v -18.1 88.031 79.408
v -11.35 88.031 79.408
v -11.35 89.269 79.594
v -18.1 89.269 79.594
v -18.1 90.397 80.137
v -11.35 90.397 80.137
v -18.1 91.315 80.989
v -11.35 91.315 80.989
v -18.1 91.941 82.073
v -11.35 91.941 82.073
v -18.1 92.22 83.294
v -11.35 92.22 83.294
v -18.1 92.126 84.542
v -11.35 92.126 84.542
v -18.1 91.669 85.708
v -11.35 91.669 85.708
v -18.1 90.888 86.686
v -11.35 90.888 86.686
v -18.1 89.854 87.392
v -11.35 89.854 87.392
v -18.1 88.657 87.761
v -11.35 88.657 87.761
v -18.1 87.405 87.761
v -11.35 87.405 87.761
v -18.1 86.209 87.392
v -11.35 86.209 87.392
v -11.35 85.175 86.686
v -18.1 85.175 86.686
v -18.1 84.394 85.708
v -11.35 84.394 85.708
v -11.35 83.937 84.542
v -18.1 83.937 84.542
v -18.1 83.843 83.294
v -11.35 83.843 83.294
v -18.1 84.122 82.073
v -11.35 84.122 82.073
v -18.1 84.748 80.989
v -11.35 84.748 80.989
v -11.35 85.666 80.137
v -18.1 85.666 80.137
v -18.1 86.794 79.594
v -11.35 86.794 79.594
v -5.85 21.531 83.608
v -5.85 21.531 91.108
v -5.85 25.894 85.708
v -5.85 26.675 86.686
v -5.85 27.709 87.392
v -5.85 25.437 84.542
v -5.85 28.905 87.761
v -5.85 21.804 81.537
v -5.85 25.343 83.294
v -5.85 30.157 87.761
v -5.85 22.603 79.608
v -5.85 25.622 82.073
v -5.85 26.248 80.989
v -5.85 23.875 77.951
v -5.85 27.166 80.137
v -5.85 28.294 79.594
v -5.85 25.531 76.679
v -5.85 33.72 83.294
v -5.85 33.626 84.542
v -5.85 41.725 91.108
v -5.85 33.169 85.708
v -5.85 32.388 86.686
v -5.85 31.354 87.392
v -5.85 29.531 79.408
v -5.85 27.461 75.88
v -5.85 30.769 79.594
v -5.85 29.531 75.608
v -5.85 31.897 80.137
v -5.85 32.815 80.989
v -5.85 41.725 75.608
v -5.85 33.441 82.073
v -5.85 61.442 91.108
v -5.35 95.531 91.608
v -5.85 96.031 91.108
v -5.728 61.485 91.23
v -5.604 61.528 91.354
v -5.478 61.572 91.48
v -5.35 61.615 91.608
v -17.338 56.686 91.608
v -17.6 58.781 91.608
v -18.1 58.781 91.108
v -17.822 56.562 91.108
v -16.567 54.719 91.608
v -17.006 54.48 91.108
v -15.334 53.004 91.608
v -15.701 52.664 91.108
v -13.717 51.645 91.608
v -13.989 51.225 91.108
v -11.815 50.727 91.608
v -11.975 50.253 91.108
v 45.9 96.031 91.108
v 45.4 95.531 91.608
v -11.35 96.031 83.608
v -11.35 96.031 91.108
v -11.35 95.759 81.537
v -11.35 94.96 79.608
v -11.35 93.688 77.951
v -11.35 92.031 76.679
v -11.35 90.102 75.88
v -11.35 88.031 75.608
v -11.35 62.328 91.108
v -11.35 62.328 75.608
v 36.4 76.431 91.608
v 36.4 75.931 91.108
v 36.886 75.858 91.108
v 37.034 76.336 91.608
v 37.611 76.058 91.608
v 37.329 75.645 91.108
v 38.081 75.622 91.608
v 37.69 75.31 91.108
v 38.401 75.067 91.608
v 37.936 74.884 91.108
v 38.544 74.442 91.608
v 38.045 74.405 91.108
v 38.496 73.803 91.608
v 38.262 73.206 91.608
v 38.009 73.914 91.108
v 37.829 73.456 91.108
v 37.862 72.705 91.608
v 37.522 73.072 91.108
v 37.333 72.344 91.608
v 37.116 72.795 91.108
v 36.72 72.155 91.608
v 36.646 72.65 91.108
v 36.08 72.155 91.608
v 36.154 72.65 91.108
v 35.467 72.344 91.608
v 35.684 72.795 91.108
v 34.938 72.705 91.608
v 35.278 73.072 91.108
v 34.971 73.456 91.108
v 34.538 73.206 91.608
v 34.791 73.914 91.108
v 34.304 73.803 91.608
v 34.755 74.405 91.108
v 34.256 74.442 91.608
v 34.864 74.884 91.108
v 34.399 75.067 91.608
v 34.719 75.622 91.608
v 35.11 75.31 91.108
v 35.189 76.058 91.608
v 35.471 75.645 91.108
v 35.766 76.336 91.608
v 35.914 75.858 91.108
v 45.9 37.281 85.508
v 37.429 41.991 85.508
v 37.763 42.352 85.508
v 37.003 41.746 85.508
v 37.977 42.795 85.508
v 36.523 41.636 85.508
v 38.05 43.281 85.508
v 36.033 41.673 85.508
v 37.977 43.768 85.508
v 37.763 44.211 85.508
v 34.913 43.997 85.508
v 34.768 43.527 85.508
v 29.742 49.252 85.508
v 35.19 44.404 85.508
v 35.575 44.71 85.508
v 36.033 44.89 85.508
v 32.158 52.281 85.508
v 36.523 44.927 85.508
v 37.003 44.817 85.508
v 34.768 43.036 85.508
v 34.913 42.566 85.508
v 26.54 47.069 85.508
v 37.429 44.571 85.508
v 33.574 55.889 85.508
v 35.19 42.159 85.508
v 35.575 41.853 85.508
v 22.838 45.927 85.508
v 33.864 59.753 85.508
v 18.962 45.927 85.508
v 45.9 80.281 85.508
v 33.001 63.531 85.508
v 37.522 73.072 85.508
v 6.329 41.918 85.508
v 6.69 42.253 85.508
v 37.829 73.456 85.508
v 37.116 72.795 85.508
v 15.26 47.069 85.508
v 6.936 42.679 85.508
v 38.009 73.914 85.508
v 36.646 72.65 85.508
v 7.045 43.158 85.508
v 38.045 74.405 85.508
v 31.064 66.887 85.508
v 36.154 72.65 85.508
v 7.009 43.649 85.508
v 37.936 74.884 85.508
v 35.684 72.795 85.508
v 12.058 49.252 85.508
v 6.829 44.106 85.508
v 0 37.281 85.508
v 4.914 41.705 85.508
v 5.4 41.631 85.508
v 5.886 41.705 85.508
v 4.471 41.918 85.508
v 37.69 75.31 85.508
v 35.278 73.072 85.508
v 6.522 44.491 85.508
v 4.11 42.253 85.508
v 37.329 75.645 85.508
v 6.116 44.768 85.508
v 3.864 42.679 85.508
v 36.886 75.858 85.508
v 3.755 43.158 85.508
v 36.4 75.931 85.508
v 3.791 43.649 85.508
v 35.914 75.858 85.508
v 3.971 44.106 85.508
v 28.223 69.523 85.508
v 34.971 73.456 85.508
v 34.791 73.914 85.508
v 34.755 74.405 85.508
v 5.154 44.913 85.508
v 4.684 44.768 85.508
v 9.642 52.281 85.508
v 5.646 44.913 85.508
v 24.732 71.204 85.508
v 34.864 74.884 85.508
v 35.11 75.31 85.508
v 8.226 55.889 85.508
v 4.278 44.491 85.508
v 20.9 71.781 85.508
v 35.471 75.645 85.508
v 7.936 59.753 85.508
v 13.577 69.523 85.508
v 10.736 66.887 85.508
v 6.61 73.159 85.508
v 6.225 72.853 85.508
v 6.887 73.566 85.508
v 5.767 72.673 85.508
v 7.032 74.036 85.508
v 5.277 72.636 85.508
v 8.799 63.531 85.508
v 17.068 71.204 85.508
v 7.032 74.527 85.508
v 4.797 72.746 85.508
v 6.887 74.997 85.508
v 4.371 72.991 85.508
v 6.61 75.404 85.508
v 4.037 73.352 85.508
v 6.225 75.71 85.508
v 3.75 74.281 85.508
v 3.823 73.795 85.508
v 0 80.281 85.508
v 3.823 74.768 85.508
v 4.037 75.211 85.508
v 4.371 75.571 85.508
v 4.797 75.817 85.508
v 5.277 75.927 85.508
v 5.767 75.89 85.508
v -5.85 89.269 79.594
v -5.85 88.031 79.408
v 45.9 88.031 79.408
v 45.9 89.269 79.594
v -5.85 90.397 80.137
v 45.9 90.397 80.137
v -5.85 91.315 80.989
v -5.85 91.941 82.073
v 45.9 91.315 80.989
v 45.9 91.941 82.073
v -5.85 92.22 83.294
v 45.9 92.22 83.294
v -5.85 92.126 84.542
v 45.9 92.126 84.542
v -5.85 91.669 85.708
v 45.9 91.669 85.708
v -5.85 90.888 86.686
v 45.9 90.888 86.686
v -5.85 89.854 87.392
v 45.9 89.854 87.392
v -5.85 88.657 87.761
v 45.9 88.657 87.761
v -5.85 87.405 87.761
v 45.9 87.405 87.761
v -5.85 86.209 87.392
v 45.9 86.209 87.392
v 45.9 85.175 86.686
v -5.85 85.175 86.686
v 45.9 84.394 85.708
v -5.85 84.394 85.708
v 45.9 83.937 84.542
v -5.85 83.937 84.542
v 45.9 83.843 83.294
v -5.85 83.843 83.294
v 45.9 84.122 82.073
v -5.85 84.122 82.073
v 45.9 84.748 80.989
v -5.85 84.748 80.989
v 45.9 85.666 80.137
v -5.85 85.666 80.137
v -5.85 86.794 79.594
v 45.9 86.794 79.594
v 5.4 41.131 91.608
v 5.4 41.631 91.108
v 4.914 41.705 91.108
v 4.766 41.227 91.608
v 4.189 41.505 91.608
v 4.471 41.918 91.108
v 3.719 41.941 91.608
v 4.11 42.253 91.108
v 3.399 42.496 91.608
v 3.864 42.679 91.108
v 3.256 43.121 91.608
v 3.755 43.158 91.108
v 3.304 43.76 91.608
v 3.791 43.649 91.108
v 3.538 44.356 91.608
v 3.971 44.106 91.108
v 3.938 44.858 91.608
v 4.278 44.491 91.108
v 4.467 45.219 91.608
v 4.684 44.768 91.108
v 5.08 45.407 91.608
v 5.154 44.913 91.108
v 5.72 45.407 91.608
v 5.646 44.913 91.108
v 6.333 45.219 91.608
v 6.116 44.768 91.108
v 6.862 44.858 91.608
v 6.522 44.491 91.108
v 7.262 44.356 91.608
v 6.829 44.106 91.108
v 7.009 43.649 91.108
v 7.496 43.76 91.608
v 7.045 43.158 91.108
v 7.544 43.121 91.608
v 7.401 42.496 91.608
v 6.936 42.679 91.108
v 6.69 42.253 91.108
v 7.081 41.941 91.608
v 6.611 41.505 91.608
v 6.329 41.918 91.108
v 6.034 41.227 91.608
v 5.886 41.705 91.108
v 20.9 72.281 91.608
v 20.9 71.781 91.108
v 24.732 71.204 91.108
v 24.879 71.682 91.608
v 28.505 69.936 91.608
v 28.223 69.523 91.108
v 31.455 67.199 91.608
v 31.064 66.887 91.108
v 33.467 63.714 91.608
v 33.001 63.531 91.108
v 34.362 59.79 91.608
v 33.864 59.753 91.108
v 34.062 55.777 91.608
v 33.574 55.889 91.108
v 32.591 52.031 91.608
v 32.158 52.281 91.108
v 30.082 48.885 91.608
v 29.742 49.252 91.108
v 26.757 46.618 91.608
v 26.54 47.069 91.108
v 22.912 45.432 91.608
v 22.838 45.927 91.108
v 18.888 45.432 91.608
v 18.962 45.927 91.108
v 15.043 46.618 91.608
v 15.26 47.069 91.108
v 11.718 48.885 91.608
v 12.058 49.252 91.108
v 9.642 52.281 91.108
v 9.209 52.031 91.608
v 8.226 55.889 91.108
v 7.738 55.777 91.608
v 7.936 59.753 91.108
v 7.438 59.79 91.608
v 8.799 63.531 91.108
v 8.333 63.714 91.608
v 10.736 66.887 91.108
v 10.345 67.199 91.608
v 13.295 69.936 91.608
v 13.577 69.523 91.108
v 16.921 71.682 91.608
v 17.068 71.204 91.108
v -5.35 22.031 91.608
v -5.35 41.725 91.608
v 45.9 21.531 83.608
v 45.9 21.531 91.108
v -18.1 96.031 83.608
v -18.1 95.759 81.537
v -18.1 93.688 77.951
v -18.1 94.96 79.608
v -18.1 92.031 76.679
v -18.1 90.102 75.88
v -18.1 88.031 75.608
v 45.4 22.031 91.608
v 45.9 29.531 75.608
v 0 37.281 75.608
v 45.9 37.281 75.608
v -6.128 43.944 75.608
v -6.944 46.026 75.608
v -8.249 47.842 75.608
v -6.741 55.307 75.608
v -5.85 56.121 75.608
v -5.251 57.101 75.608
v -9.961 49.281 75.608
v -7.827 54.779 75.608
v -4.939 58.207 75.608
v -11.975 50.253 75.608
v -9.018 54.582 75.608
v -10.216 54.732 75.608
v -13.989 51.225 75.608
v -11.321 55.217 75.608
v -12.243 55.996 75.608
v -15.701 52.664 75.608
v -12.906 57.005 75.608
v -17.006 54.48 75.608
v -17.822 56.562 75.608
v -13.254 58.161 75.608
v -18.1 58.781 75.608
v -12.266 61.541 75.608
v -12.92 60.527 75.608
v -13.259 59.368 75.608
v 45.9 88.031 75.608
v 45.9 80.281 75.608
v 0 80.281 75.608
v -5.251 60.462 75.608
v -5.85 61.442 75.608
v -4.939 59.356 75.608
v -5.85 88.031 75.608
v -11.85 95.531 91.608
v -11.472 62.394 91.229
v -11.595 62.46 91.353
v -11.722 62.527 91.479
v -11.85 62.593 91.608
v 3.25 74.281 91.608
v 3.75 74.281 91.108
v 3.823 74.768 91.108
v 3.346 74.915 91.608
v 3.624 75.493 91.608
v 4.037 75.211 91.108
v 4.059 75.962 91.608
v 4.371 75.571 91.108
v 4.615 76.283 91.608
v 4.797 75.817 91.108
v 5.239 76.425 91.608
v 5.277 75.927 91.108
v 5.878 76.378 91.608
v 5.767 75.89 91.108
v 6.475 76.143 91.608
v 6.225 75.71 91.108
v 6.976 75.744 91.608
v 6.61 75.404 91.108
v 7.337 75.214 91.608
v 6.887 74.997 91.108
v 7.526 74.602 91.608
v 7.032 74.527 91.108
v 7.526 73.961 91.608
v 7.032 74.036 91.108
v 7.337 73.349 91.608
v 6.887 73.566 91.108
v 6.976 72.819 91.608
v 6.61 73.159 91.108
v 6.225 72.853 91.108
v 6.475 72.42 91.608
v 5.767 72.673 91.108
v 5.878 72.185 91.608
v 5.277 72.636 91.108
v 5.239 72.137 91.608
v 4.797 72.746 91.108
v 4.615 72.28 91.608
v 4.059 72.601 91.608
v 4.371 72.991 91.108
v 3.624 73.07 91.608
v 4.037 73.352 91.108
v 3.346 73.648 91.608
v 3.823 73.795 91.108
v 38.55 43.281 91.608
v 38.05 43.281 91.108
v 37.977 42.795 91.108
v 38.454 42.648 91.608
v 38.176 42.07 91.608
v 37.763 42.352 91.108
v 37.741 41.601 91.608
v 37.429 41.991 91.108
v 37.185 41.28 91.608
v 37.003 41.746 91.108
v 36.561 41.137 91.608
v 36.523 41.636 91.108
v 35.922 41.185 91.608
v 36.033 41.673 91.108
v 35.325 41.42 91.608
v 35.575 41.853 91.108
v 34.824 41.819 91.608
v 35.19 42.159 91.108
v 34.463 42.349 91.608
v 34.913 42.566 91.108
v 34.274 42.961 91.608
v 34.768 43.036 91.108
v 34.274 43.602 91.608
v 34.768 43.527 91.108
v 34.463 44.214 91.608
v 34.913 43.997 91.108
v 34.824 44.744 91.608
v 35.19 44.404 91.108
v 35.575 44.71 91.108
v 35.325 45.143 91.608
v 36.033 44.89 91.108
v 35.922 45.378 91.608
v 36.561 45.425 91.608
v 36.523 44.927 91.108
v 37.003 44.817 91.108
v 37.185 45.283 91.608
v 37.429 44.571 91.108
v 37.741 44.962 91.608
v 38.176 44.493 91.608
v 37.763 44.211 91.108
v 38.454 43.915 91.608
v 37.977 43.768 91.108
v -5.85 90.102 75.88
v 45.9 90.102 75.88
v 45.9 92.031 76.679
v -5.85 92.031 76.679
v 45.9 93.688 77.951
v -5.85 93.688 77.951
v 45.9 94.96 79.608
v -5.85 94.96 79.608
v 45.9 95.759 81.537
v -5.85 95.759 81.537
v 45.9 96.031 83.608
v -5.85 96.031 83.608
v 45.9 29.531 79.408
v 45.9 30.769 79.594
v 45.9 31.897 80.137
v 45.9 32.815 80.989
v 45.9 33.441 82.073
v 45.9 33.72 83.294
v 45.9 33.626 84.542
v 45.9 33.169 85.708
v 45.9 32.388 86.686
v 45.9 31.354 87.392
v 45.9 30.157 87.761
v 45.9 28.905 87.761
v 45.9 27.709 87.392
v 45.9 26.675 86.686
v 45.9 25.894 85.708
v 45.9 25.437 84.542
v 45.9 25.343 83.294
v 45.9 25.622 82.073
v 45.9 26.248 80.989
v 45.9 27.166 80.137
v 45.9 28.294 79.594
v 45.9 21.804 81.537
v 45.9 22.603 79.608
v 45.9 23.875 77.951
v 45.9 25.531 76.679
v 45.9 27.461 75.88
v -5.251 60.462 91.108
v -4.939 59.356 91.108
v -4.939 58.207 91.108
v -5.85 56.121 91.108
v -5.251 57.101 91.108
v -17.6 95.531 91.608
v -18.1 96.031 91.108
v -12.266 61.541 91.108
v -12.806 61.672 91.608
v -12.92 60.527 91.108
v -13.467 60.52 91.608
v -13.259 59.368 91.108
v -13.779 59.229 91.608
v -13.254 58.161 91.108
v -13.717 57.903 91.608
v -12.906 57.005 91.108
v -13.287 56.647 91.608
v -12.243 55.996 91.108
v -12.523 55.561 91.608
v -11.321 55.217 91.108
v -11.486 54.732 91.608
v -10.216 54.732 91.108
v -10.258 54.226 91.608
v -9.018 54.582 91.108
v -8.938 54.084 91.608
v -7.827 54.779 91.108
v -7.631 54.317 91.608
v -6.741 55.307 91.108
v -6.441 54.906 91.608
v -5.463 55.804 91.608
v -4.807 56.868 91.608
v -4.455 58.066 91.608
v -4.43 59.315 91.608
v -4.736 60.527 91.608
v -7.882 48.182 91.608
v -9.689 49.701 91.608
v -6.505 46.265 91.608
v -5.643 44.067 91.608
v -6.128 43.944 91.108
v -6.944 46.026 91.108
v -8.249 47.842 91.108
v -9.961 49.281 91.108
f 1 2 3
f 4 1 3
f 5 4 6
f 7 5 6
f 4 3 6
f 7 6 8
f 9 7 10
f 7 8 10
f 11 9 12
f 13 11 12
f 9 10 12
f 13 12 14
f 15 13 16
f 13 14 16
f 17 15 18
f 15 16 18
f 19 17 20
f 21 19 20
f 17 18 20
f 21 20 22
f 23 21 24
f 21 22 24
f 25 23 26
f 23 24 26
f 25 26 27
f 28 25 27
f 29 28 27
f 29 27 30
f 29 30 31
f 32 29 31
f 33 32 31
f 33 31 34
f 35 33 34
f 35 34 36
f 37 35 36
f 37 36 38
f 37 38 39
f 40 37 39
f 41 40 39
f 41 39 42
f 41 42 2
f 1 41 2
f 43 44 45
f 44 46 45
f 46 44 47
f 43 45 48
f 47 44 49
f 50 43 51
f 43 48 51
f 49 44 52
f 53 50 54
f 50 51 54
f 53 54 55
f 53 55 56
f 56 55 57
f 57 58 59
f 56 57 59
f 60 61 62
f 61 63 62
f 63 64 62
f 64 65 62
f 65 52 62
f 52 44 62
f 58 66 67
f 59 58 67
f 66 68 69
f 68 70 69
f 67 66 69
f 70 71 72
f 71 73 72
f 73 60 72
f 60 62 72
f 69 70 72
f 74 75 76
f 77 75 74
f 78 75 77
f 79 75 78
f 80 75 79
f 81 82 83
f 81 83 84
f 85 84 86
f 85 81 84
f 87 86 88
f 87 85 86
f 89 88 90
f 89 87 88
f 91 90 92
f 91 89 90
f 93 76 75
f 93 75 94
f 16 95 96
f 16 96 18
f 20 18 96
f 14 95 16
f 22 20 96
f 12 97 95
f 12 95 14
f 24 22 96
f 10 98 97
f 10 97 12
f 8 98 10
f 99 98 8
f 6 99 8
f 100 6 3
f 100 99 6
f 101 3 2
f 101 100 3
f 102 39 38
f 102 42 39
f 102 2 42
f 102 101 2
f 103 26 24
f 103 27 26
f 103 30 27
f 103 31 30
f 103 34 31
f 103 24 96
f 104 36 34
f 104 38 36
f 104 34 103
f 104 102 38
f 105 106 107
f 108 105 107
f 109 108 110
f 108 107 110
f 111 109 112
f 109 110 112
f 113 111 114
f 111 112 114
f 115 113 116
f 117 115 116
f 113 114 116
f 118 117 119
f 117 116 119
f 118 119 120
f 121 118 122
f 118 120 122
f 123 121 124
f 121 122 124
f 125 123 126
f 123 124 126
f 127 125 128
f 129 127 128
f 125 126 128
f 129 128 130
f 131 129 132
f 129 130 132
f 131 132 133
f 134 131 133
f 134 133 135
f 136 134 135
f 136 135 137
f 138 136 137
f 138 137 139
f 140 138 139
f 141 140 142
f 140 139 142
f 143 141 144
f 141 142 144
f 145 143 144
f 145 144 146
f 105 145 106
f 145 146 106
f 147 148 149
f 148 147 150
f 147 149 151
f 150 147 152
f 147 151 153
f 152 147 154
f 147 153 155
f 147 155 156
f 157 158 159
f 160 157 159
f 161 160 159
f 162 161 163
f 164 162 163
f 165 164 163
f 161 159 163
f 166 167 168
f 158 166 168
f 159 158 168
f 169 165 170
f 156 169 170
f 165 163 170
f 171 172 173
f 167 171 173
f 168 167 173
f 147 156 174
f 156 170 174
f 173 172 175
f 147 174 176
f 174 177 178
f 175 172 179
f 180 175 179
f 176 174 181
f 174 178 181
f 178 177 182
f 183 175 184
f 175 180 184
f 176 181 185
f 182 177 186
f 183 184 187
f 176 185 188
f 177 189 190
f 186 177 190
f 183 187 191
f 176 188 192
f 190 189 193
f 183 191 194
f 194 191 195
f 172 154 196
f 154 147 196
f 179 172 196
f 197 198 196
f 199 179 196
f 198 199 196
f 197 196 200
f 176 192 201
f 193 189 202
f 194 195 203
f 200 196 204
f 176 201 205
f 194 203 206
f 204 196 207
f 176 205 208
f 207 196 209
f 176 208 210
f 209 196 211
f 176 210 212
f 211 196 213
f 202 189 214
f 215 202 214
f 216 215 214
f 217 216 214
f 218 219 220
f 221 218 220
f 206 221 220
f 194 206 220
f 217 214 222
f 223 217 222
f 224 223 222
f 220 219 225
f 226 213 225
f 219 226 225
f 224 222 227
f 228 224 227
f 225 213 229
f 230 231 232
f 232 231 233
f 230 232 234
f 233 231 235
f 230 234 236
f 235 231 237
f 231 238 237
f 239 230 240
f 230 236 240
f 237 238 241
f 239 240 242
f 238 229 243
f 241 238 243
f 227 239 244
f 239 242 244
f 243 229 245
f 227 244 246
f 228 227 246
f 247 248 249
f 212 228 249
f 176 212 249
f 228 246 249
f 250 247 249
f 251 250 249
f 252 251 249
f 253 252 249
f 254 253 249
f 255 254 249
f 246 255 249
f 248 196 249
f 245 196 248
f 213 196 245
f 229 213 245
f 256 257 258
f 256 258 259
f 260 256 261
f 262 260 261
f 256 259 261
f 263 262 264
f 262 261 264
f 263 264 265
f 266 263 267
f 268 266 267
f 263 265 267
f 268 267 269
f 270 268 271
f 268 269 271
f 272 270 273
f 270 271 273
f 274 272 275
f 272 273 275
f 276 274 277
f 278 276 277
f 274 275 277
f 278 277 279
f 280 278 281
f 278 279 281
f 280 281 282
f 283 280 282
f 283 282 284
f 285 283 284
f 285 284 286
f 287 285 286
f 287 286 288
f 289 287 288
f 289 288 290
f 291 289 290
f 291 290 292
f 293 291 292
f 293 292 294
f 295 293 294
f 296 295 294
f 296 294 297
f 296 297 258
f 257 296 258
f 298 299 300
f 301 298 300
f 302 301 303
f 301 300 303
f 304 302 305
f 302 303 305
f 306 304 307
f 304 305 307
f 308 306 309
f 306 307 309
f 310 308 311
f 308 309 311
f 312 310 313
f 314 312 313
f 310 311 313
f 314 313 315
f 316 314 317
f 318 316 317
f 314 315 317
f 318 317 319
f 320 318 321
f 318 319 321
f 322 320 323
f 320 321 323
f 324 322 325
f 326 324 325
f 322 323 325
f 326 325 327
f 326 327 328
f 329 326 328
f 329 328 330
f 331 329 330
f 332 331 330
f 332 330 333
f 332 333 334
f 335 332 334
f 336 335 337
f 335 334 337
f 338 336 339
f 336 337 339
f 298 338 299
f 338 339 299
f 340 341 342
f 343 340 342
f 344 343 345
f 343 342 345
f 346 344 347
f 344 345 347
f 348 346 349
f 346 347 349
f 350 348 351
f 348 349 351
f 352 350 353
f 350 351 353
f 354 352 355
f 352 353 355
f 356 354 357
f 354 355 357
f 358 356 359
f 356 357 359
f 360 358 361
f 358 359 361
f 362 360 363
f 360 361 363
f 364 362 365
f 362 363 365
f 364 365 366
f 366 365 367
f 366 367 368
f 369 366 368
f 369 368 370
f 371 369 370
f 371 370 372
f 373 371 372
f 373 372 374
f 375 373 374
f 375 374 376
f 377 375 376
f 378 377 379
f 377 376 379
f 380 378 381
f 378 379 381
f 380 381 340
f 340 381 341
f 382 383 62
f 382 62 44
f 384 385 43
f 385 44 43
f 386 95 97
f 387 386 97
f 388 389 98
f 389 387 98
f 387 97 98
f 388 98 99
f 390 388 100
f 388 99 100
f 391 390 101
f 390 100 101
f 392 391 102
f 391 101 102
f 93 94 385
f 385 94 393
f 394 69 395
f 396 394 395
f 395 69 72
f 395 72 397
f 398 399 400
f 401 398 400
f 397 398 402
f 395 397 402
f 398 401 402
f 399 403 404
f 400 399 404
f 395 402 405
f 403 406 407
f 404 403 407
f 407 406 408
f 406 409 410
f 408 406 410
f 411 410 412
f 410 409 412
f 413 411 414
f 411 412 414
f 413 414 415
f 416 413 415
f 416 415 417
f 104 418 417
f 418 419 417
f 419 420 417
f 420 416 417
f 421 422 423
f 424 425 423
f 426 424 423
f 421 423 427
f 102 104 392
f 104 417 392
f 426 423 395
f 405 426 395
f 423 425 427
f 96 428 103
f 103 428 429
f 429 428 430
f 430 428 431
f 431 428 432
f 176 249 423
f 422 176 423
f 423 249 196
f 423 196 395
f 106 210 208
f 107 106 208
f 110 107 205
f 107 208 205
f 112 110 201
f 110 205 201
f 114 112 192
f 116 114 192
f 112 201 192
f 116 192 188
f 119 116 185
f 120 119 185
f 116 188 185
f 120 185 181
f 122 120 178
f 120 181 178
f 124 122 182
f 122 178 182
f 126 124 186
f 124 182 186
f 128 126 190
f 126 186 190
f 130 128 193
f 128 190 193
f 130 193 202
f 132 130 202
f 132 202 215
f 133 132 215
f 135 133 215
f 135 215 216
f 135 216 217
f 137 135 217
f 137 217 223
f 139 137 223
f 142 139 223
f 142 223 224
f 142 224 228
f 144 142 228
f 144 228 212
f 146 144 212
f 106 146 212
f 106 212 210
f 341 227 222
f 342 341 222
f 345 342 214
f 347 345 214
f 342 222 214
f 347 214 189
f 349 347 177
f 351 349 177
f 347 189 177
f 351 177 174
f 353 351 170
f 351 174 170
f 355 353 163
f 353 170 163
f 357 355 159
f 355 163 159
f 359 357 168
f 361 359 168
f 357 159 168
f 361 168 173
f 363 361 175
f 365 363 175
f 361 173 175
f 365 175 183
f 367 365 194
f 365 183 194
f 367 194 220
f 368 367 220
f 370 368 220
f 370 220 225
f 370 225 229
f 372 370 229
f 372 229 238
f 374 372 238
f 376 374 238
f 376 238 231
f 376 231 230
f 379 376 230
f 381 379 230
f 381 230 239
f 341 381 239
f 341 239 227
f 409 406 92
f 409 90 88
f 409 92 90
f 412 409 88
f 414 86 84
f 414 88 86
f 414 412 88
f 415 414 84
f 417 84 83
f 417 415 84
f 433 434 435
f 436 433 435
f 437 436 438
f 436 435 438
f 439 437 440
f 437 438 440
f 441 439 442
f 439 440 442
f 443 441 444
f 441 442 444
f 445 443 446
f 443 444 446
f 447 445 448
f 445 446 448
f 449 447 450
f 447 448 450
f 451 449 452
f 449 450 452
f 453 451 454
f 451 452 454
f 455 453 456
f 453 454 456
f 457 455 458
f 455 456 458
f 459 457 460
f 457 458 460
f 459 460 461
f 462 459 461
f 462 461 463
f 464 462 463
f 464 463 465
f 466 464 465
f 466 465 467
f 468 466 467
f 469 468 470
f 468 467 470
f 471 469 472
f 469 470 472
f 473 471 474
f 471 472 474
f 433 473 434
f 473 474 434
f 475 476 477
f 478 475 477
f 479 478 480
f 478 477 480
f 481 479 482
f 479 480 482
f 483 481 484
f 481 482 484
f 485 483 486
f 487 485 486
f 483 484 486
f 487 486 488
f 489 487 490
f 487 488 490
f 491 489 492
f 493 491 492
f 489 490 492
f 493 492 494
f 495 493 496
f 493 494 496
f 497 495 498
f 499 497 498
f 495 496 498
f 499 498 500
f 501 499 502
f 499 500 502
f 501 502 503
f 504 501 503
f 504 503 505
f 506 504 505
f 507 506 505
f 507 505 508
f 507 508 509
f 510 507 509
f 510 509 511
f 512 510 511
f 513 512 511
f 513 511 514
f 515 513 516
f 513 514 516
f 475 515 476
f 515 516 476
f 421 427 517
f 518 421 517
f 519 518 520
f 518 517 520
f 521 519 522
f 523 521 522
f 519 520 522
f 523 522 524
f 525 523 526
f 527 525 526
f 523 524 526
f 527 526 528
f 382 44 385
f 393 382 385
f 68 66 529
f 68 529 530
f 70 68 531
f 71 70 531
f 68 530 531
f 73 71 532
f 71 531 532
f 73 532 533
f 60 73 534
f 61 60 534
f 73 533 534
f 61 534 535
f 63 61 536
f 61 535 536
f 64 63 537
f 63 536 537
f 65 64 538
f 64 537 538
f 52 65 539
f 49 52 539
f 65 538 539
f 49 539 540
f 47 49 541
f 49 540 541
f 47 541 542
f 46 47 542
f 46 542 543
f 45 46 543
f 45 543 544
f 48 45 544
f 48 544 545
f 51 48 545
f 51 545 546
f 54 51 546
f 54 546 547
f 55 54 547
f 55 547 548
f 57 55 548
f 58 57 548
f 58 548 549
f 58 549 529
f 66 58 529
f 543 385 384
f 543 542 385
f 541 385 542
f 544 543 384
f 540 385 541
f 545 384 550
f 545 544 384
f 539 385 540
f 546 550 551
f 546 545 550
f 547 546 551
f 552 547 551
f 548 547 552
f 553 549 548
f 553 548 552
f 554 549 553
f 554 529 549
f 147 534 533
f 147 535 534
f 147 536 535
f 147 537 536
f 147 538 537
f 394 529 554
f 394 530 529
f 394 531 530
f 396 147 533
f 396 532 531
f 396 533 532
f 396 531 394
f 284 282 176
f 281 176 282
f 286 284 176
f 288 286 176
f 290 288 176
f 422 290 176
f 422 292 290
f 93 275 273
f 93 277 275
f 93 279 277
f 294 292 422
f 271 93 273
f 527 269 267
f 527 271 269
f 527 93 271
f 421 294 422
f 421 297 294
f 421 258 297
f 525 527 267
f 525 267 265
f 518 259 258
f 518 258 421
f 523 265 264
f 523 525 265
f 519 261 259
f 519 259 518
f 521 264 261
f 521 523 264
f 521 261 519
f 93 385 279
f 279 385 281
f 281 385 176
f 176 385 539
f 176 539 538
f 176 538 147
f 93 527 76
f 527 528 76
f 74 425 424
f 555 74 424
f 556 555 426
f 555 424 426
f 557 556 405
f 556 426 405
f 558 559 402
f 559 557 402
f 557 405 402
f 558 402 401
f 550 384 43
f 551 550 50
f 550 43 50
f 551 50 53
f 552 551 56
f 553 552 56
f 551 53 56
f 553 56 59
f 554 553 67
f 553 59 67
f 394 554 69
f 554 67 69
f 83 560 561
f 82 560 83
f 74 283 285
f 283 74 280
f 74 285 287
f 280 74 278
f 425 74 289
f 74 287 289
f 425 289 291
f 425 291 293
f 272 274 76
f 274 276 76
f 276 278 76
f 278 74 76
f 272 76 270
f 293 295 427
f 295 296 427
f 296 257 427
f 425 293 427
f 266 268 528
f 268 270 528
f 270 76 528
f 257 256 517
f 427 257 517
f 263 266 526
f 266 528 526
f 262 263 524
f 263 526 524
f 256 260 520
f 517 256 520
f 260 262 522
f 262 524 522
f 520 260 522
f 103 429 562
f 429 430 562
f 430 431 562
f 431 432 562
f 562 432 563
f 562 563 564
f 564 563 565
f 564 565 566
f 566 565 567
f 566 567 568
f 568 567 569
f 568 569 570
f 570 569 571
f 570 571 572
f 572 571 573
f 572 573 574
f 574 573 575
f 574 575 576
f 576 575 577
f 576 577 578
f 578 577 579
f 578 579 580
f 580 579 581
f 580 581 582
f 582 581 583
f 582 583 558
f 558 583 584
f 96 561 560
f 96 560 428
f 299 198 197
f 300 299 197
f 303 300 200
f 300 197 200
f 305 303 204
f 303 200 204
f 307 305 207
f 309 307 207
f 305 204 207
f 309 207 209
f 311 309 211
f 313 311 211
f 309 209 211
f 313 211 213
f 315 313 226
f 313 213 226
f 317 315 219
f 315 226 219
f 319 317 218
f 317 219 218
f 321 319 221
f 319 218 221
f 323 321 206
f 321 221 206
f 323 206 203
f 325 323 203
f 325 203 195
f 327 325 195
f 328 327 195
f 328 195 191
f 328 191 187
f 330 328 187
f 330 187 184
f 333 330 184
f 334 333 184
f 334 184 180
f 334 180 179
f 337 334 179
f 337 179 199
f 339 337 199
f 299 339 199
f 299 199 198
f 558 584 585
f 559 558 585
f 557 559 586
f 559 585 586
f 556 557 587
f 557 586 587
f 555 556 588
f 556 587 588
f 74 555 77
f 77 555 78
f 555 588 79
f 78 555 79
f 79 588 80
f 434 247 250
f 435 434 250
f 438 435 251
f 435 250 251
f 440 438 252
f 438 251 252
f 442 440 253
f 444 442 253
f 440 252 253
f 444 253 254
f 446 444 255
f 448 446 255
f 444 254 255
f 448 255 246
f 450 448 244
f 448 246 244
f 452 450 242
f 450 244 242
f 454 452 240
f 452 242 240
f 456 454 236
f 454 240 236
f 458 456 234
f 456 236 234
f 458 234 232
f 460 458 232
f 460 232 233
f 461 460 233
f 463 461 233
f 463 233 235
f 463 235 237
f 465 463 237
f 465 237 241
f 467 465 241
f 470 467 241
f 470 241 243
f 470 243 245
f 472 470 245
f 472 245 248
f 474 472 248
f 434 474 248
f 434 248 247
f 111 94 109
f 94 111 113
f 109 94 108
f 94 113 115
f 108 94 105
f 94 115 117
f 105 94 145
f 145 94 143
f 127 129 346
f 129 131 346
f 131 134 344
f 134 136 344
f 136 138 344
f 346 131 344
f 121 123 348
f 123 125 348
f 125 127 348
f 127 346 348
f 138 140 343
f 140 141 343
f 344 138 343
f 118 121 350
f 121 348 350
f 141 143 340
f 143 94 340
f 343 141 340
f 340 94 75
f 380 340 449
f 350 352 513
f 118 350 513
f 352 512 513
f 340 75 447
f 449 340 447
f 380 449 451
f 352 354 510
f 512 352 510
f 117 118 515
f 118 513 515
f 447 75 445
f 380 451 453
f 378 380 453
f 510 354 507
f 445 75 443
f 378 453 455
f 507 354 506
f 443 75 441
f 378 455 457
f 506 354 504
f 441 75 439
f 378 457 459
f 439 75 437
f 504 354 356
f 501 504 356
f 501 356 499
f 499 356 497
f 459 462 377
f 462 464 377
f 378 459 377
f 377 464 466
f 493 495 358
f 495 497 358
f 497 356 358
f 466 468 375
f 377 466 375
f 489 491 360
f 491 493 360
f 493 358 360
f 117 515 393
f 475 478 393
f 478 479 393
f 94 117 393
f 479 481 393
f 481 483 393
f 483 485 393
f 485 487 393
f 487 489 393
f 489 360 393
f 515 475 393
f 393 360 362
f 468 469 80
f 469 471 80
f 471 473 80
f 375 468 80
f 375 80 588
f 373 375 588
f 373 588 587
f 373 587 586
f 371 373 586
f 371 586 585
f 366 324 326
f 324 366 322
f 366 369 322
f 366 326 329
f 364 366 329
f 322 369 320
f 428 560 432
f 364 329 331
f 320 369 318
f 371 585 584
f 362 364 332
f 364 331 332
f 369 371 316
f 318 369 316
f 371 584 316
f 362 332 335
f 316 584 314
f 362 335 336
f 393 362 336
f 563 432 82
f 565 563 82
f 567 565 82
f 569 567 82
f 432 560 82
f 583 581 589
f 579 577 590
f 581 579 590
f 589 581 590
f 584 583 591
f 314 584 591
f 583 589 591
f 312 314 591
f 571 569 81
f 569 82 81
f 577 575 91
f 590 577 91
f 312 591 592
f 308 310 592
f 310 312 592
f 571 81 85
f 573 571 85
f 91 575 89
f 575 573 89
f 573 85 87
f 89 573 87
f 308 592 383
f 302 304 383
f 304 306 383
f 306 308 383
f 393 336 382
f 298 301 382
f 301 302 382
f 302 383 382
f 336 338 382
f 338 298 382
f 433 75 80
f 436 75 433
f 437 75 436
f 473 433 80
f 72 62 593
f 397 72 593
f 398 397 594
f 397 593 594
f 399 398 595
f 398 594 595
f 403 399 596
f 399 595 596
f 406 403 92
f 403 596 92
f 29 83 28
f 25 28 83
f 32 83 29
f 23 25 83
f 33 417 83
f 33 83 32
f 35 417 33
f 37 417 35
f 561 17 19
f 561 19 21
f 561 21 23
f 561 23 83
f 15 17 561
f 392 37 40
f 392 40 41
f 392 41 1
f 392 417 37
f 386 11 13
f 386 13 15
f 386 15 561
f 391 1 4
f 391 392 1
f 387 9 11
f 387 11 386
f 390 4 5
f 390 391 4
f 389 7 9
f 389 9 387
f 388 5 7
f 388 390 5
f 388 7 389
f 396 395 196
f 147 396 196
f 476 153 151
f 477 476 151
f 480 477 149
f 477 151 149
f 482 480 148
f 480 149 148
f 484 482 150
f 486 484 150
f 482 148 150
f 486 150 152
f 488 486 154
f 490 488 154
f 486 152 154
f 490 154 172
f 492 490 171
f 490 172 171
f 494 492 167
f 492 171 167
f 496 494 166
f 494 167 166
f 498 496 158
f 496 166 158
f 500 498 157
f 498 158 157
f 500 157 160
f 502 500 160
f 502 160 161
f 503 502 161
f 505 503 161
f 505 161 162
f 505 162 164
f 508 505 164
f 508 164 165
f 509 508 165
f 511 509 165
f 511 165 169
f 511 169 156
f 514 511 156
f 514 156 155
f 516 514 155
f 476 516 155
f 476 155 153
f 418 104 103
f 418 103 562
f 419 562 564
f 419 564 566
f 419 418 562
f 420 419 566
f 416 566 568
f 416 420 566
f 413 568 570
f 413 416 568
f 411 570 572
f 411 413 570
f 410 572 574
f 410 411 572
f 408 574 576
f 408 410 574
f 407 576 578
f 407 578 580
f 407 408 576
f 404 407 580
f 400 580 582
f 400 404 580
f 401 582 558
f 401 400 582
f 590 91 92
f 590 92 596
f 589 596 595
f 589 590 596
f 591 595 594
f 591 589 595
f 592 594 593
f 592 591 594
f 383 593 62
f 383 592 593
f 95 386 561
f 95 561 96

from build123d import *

# Parameters (mm, degrees)
BOSS_EXTRUDE1_DEPTH = 45.9
BOSS_EXTRUDE2_START = 5.85
BOSS_EXTRUDE2_DEPTH = 5.85
SKETCH5_R           = 13
CUT_EXTRUDE1_DEPTH  = 107.896512669
BOSS_EXTRUDE3_DEPTH = 16
CUT_EXTRUDE3_DEPTH  = 108.63296159
FILLET2_R           = 9
SKETCH6_R           = 4.2
CUT_EXTRUDE2_DEPTH  = 148.343120723
SKETCH9_R           = 1.65
CUT_EXTRUDE5_DEPTH  = 107.896512669
CIRPATTERN1_COUNT   = 4
CUT_EXTRUDE6_DEPTH  = 145.539121778
CHAMFER1_SIZE       = 0.5


with BuildPart() as part:
    # Sketch2 → Boss-Extrude1 (new body)
    with BuildSketch(Plane(origin=(0, 0, 0), x_dir=(0, 0, -1), z_dir=(1, 0, 0))):
        with BuildLine():
            Line((-75.607591408, 29.531476198), (-75.607591408, 37.281476198))
            Line((-75.607591408, 37.281476198), (-85.507591408, 37.281476198))
            Line((-85.507591408, 37.281476198), (-85.507591408, 80.281476198))
            Line((-85.507591408, 80.281476198), (-75.607591408, 80.281476198))
            Line((-75.607591408, 80.281476198), (-75.607591408, 88.031476198))
            ThreePointArc((-75.607591408, 88.031476198), (-77.950737158, 93.688330447), (-83.607591408, 96.031476198))
            Line((-83.607591408, 96.031476198), (-91.607591408, 96.031476198))
            Line((-91.607591408, 96.031476198), (-91.607591408, 21.531476198))
            Line((-91.607591408, 21.531476198), (-83.607591408, 21.531476198))
            ThreePointArc((-83.607591408, 21.531476198), (-77.950737158, 23.874621948), (-75.607591408, 29.531476198))
        make_face()
    extrude(amount=BOSS_EXTRUDE1_DEPTH)

    # Sketch3 → Boss-Extrude2 (add)
    with BuildSketch(Plane.ZY.offset(BOSS_EXTRUDE2_START)):
        with BuildLine():
            Line((75.607591408, 37.281476198), (75.607591408, 80.281476198))
            Line((75.607591408, 80.281476198), (75.607591408, 88.031476198))
            ThreePointArc((75.607591408, 88.031476198), (77.950737158, 93.688330447), (83.607591408, 96.031476198))
            Line((83.607591408, 96.031476198), (91.607591408, 96.031476198))
            Line((91.607591408, 96.031476198), (91.607591408, 21.531476198))
            Line((91.607591408, 21.531476198), (83.607591408, 21.531476198))
            ThreePointArc((83.607591408, 21.531476198), (77.950737158, 23.874621948), (75.607591408, 29.531476198))
            Line((75.607591408, 29.531476198), (75.607591408, 37.281476198))
        make_face()
    extrude(amount=-BOSS_EXTRUDE2_DEPTH)

    # Sketch5 → Cut-Extrude1 (cut, through all)
    with BuildSketch(Plane(origin=(0, 0, 85.507591408), x_dir=(-1, 0, 0), z_dir=(0, 0, -1))):
        with Locations(Location((-20.9, 58.781476198, 0), (0, 0, 90))):
            Circle(SKETCH5_R)
    extrude(amount=-CUT_EXTRUDE1_DEPTH, mode=Mode.SUBTRACT)

    # Sketch7 → Boss-Extrude3 (add)
    with BuildSketch(Plane(origin=(0, 0, 75.607591408), x_dir=(-1, 0, 0), z_dir=(0, 0, -1))):
        with BuildLine():
            ThreePointArc((5.85, 50.388771032), (14.186747487, 51.356854995), (18.1, 58.781476198))
            Line((18.1, 58.781476198), (18.1, 96.031476198))
            Line((18.1, 96.031476198), (11.35, 96.031476198))
            Line((11.35, 96.031476198), (11.35, 62.327953323))
            ThreePointArc((11.35, 62.327953323), (12.243437264, 55.996013549), (5.85, 56.121119079))
            Line((5.85, 56.121119079), (5.85, 50.388771032))
        make_face()
    extrude(amount=-BOSS_EXTRUDE3_DEPTH)

    # Sketch7<3> → Cut-Extrude3 (cut, through all)
    with BuildSketch(Plane(origin=(0, 0, 75.607591408), x_dir=(-1, 0, 0), z_dir=(0, 0, -1))):
        with BuildLine():
            ThreePointArc((5.85, 61.441833317), (4.9, 58.781476198), (5.85, 56.121119079))
            Line((5.85, 56.121119079), (5.85, 61.441833317))
        make_face()
    extrude(amount=-CUT_EXTRUDE3_DEPTH, mode=Mode.SUBTRACT)

    # Fillet2
    fillet2_edges = [part.edges().sort_by_distance(p)[0] for p in [
        (-5.85, 50.388771032, 83.607591408),
    ]]
    fillet(fillet2_edges, radius=FILLET2_R)

    # Sketch6 → Cut-Extrude2 (cut, through all)
    with BuildSketch(Plane(origin=(45.9, 0, 0), x_dir=(0, 0, -1), z_dir=(1, 0, 0))):
        with Locations((-83.607591408, 88.031476198)):
            Circle(SKETCH6_R)
        with Locations((-83.607591408, 29.531476198)):
            Circle(SKETCH6_R)
    extrude(amount=-CUT_EXTRUDE2_DEPTH, mode=Mode.SUBTRACT)

    # Sketch9 → Cut-Extrude5 (cut, through all)
    with BuildSketch(Plane(origin=(0, 0, 85.507591408), x_dir=(-1, 0, 0), z_dir=(0, 0, -1))):
        with Locations(Location((-36.4, 74.281476198, 0), (0, 0, 90))):
            Circle(SKETCH9_R)
    cut_extrude5 = extrude(amount=-CUT_EXTRUDE5_DEPTH, mode=Mode.SUBTRACT)

    # CirPattern1: Cut-Extrude5 ×4 about axis
    cirpattern1_axis = Axis((20.9, 58.781476198, 0), (0, 0, 1))
    for i in range(1, CIRPATTERN1_COUNT):
        add(cut_extrude5.rotate(cirpattern1_axis, i * 360 / CIRPATTERN1_COUNT), mode=Mode.SUBTRACT)

    # Sketch10 → Cut-Extrude6 (cut, through all)
    with BuildSketch(Plane(origin=(-11.35, 0, 0), x_dir=(0, 0, -1), z_dir=(1, 0, 0))):
        with BuildLine():
            ThreePointArc((-83.607591408, 96.031476198), (-77.950737158, 93.688330447), (-75.607591408, 88.031476198))
            Line((-75.607591408, 88.031476198), (-75.607591408, 96.031476198))
            Line((-75.607591408, 96.031476198), (-83.607591408, 96.031476198))
        make_face()
    extrude(amount=-CUT_EXTRUDE6_DEPTH, mode=Mode.SUBTRACT)

    # Chamfer1
    chamfer1_edges = [part.edges().sort_by_distance(p)[0] for p in [
        (36.4, 72.631476198, 91.607591408),
        (34.75, 43.281476198, 91.607591408),
        (5.4, 44.931476198, 91.607591408),
        (7.05, 74.281476198, 91.607591408),
        (20.025, 21.531476198, 91.607591408),
        (20.025, 96.031476198, 91.607591408),
        (45.9, 58.781476198, 91.607591408),
        (-5.85, 31.628031146, 91.607591408),
        (20.9, 45.781476198, 91.607591408),
        (-12.243437264, 55.996013549, 91.607591408),
        (-14.725, 96.031476198, 91.607591408),
        (-11.35, 79.17971476, 91.607591408),
        (-18.1, 77.406476198, 91.607591408),
        (-16.410095759, 53.531476198, 91.607591408),
        (-5.85, 78.736654757, 91.607591408),
        (-7.539904241, 46.974586094, 91.607591408),
    ]]
    chamfer(chamfer1_edges, length=CHAMFER1_SIZE)


solid = part.part
